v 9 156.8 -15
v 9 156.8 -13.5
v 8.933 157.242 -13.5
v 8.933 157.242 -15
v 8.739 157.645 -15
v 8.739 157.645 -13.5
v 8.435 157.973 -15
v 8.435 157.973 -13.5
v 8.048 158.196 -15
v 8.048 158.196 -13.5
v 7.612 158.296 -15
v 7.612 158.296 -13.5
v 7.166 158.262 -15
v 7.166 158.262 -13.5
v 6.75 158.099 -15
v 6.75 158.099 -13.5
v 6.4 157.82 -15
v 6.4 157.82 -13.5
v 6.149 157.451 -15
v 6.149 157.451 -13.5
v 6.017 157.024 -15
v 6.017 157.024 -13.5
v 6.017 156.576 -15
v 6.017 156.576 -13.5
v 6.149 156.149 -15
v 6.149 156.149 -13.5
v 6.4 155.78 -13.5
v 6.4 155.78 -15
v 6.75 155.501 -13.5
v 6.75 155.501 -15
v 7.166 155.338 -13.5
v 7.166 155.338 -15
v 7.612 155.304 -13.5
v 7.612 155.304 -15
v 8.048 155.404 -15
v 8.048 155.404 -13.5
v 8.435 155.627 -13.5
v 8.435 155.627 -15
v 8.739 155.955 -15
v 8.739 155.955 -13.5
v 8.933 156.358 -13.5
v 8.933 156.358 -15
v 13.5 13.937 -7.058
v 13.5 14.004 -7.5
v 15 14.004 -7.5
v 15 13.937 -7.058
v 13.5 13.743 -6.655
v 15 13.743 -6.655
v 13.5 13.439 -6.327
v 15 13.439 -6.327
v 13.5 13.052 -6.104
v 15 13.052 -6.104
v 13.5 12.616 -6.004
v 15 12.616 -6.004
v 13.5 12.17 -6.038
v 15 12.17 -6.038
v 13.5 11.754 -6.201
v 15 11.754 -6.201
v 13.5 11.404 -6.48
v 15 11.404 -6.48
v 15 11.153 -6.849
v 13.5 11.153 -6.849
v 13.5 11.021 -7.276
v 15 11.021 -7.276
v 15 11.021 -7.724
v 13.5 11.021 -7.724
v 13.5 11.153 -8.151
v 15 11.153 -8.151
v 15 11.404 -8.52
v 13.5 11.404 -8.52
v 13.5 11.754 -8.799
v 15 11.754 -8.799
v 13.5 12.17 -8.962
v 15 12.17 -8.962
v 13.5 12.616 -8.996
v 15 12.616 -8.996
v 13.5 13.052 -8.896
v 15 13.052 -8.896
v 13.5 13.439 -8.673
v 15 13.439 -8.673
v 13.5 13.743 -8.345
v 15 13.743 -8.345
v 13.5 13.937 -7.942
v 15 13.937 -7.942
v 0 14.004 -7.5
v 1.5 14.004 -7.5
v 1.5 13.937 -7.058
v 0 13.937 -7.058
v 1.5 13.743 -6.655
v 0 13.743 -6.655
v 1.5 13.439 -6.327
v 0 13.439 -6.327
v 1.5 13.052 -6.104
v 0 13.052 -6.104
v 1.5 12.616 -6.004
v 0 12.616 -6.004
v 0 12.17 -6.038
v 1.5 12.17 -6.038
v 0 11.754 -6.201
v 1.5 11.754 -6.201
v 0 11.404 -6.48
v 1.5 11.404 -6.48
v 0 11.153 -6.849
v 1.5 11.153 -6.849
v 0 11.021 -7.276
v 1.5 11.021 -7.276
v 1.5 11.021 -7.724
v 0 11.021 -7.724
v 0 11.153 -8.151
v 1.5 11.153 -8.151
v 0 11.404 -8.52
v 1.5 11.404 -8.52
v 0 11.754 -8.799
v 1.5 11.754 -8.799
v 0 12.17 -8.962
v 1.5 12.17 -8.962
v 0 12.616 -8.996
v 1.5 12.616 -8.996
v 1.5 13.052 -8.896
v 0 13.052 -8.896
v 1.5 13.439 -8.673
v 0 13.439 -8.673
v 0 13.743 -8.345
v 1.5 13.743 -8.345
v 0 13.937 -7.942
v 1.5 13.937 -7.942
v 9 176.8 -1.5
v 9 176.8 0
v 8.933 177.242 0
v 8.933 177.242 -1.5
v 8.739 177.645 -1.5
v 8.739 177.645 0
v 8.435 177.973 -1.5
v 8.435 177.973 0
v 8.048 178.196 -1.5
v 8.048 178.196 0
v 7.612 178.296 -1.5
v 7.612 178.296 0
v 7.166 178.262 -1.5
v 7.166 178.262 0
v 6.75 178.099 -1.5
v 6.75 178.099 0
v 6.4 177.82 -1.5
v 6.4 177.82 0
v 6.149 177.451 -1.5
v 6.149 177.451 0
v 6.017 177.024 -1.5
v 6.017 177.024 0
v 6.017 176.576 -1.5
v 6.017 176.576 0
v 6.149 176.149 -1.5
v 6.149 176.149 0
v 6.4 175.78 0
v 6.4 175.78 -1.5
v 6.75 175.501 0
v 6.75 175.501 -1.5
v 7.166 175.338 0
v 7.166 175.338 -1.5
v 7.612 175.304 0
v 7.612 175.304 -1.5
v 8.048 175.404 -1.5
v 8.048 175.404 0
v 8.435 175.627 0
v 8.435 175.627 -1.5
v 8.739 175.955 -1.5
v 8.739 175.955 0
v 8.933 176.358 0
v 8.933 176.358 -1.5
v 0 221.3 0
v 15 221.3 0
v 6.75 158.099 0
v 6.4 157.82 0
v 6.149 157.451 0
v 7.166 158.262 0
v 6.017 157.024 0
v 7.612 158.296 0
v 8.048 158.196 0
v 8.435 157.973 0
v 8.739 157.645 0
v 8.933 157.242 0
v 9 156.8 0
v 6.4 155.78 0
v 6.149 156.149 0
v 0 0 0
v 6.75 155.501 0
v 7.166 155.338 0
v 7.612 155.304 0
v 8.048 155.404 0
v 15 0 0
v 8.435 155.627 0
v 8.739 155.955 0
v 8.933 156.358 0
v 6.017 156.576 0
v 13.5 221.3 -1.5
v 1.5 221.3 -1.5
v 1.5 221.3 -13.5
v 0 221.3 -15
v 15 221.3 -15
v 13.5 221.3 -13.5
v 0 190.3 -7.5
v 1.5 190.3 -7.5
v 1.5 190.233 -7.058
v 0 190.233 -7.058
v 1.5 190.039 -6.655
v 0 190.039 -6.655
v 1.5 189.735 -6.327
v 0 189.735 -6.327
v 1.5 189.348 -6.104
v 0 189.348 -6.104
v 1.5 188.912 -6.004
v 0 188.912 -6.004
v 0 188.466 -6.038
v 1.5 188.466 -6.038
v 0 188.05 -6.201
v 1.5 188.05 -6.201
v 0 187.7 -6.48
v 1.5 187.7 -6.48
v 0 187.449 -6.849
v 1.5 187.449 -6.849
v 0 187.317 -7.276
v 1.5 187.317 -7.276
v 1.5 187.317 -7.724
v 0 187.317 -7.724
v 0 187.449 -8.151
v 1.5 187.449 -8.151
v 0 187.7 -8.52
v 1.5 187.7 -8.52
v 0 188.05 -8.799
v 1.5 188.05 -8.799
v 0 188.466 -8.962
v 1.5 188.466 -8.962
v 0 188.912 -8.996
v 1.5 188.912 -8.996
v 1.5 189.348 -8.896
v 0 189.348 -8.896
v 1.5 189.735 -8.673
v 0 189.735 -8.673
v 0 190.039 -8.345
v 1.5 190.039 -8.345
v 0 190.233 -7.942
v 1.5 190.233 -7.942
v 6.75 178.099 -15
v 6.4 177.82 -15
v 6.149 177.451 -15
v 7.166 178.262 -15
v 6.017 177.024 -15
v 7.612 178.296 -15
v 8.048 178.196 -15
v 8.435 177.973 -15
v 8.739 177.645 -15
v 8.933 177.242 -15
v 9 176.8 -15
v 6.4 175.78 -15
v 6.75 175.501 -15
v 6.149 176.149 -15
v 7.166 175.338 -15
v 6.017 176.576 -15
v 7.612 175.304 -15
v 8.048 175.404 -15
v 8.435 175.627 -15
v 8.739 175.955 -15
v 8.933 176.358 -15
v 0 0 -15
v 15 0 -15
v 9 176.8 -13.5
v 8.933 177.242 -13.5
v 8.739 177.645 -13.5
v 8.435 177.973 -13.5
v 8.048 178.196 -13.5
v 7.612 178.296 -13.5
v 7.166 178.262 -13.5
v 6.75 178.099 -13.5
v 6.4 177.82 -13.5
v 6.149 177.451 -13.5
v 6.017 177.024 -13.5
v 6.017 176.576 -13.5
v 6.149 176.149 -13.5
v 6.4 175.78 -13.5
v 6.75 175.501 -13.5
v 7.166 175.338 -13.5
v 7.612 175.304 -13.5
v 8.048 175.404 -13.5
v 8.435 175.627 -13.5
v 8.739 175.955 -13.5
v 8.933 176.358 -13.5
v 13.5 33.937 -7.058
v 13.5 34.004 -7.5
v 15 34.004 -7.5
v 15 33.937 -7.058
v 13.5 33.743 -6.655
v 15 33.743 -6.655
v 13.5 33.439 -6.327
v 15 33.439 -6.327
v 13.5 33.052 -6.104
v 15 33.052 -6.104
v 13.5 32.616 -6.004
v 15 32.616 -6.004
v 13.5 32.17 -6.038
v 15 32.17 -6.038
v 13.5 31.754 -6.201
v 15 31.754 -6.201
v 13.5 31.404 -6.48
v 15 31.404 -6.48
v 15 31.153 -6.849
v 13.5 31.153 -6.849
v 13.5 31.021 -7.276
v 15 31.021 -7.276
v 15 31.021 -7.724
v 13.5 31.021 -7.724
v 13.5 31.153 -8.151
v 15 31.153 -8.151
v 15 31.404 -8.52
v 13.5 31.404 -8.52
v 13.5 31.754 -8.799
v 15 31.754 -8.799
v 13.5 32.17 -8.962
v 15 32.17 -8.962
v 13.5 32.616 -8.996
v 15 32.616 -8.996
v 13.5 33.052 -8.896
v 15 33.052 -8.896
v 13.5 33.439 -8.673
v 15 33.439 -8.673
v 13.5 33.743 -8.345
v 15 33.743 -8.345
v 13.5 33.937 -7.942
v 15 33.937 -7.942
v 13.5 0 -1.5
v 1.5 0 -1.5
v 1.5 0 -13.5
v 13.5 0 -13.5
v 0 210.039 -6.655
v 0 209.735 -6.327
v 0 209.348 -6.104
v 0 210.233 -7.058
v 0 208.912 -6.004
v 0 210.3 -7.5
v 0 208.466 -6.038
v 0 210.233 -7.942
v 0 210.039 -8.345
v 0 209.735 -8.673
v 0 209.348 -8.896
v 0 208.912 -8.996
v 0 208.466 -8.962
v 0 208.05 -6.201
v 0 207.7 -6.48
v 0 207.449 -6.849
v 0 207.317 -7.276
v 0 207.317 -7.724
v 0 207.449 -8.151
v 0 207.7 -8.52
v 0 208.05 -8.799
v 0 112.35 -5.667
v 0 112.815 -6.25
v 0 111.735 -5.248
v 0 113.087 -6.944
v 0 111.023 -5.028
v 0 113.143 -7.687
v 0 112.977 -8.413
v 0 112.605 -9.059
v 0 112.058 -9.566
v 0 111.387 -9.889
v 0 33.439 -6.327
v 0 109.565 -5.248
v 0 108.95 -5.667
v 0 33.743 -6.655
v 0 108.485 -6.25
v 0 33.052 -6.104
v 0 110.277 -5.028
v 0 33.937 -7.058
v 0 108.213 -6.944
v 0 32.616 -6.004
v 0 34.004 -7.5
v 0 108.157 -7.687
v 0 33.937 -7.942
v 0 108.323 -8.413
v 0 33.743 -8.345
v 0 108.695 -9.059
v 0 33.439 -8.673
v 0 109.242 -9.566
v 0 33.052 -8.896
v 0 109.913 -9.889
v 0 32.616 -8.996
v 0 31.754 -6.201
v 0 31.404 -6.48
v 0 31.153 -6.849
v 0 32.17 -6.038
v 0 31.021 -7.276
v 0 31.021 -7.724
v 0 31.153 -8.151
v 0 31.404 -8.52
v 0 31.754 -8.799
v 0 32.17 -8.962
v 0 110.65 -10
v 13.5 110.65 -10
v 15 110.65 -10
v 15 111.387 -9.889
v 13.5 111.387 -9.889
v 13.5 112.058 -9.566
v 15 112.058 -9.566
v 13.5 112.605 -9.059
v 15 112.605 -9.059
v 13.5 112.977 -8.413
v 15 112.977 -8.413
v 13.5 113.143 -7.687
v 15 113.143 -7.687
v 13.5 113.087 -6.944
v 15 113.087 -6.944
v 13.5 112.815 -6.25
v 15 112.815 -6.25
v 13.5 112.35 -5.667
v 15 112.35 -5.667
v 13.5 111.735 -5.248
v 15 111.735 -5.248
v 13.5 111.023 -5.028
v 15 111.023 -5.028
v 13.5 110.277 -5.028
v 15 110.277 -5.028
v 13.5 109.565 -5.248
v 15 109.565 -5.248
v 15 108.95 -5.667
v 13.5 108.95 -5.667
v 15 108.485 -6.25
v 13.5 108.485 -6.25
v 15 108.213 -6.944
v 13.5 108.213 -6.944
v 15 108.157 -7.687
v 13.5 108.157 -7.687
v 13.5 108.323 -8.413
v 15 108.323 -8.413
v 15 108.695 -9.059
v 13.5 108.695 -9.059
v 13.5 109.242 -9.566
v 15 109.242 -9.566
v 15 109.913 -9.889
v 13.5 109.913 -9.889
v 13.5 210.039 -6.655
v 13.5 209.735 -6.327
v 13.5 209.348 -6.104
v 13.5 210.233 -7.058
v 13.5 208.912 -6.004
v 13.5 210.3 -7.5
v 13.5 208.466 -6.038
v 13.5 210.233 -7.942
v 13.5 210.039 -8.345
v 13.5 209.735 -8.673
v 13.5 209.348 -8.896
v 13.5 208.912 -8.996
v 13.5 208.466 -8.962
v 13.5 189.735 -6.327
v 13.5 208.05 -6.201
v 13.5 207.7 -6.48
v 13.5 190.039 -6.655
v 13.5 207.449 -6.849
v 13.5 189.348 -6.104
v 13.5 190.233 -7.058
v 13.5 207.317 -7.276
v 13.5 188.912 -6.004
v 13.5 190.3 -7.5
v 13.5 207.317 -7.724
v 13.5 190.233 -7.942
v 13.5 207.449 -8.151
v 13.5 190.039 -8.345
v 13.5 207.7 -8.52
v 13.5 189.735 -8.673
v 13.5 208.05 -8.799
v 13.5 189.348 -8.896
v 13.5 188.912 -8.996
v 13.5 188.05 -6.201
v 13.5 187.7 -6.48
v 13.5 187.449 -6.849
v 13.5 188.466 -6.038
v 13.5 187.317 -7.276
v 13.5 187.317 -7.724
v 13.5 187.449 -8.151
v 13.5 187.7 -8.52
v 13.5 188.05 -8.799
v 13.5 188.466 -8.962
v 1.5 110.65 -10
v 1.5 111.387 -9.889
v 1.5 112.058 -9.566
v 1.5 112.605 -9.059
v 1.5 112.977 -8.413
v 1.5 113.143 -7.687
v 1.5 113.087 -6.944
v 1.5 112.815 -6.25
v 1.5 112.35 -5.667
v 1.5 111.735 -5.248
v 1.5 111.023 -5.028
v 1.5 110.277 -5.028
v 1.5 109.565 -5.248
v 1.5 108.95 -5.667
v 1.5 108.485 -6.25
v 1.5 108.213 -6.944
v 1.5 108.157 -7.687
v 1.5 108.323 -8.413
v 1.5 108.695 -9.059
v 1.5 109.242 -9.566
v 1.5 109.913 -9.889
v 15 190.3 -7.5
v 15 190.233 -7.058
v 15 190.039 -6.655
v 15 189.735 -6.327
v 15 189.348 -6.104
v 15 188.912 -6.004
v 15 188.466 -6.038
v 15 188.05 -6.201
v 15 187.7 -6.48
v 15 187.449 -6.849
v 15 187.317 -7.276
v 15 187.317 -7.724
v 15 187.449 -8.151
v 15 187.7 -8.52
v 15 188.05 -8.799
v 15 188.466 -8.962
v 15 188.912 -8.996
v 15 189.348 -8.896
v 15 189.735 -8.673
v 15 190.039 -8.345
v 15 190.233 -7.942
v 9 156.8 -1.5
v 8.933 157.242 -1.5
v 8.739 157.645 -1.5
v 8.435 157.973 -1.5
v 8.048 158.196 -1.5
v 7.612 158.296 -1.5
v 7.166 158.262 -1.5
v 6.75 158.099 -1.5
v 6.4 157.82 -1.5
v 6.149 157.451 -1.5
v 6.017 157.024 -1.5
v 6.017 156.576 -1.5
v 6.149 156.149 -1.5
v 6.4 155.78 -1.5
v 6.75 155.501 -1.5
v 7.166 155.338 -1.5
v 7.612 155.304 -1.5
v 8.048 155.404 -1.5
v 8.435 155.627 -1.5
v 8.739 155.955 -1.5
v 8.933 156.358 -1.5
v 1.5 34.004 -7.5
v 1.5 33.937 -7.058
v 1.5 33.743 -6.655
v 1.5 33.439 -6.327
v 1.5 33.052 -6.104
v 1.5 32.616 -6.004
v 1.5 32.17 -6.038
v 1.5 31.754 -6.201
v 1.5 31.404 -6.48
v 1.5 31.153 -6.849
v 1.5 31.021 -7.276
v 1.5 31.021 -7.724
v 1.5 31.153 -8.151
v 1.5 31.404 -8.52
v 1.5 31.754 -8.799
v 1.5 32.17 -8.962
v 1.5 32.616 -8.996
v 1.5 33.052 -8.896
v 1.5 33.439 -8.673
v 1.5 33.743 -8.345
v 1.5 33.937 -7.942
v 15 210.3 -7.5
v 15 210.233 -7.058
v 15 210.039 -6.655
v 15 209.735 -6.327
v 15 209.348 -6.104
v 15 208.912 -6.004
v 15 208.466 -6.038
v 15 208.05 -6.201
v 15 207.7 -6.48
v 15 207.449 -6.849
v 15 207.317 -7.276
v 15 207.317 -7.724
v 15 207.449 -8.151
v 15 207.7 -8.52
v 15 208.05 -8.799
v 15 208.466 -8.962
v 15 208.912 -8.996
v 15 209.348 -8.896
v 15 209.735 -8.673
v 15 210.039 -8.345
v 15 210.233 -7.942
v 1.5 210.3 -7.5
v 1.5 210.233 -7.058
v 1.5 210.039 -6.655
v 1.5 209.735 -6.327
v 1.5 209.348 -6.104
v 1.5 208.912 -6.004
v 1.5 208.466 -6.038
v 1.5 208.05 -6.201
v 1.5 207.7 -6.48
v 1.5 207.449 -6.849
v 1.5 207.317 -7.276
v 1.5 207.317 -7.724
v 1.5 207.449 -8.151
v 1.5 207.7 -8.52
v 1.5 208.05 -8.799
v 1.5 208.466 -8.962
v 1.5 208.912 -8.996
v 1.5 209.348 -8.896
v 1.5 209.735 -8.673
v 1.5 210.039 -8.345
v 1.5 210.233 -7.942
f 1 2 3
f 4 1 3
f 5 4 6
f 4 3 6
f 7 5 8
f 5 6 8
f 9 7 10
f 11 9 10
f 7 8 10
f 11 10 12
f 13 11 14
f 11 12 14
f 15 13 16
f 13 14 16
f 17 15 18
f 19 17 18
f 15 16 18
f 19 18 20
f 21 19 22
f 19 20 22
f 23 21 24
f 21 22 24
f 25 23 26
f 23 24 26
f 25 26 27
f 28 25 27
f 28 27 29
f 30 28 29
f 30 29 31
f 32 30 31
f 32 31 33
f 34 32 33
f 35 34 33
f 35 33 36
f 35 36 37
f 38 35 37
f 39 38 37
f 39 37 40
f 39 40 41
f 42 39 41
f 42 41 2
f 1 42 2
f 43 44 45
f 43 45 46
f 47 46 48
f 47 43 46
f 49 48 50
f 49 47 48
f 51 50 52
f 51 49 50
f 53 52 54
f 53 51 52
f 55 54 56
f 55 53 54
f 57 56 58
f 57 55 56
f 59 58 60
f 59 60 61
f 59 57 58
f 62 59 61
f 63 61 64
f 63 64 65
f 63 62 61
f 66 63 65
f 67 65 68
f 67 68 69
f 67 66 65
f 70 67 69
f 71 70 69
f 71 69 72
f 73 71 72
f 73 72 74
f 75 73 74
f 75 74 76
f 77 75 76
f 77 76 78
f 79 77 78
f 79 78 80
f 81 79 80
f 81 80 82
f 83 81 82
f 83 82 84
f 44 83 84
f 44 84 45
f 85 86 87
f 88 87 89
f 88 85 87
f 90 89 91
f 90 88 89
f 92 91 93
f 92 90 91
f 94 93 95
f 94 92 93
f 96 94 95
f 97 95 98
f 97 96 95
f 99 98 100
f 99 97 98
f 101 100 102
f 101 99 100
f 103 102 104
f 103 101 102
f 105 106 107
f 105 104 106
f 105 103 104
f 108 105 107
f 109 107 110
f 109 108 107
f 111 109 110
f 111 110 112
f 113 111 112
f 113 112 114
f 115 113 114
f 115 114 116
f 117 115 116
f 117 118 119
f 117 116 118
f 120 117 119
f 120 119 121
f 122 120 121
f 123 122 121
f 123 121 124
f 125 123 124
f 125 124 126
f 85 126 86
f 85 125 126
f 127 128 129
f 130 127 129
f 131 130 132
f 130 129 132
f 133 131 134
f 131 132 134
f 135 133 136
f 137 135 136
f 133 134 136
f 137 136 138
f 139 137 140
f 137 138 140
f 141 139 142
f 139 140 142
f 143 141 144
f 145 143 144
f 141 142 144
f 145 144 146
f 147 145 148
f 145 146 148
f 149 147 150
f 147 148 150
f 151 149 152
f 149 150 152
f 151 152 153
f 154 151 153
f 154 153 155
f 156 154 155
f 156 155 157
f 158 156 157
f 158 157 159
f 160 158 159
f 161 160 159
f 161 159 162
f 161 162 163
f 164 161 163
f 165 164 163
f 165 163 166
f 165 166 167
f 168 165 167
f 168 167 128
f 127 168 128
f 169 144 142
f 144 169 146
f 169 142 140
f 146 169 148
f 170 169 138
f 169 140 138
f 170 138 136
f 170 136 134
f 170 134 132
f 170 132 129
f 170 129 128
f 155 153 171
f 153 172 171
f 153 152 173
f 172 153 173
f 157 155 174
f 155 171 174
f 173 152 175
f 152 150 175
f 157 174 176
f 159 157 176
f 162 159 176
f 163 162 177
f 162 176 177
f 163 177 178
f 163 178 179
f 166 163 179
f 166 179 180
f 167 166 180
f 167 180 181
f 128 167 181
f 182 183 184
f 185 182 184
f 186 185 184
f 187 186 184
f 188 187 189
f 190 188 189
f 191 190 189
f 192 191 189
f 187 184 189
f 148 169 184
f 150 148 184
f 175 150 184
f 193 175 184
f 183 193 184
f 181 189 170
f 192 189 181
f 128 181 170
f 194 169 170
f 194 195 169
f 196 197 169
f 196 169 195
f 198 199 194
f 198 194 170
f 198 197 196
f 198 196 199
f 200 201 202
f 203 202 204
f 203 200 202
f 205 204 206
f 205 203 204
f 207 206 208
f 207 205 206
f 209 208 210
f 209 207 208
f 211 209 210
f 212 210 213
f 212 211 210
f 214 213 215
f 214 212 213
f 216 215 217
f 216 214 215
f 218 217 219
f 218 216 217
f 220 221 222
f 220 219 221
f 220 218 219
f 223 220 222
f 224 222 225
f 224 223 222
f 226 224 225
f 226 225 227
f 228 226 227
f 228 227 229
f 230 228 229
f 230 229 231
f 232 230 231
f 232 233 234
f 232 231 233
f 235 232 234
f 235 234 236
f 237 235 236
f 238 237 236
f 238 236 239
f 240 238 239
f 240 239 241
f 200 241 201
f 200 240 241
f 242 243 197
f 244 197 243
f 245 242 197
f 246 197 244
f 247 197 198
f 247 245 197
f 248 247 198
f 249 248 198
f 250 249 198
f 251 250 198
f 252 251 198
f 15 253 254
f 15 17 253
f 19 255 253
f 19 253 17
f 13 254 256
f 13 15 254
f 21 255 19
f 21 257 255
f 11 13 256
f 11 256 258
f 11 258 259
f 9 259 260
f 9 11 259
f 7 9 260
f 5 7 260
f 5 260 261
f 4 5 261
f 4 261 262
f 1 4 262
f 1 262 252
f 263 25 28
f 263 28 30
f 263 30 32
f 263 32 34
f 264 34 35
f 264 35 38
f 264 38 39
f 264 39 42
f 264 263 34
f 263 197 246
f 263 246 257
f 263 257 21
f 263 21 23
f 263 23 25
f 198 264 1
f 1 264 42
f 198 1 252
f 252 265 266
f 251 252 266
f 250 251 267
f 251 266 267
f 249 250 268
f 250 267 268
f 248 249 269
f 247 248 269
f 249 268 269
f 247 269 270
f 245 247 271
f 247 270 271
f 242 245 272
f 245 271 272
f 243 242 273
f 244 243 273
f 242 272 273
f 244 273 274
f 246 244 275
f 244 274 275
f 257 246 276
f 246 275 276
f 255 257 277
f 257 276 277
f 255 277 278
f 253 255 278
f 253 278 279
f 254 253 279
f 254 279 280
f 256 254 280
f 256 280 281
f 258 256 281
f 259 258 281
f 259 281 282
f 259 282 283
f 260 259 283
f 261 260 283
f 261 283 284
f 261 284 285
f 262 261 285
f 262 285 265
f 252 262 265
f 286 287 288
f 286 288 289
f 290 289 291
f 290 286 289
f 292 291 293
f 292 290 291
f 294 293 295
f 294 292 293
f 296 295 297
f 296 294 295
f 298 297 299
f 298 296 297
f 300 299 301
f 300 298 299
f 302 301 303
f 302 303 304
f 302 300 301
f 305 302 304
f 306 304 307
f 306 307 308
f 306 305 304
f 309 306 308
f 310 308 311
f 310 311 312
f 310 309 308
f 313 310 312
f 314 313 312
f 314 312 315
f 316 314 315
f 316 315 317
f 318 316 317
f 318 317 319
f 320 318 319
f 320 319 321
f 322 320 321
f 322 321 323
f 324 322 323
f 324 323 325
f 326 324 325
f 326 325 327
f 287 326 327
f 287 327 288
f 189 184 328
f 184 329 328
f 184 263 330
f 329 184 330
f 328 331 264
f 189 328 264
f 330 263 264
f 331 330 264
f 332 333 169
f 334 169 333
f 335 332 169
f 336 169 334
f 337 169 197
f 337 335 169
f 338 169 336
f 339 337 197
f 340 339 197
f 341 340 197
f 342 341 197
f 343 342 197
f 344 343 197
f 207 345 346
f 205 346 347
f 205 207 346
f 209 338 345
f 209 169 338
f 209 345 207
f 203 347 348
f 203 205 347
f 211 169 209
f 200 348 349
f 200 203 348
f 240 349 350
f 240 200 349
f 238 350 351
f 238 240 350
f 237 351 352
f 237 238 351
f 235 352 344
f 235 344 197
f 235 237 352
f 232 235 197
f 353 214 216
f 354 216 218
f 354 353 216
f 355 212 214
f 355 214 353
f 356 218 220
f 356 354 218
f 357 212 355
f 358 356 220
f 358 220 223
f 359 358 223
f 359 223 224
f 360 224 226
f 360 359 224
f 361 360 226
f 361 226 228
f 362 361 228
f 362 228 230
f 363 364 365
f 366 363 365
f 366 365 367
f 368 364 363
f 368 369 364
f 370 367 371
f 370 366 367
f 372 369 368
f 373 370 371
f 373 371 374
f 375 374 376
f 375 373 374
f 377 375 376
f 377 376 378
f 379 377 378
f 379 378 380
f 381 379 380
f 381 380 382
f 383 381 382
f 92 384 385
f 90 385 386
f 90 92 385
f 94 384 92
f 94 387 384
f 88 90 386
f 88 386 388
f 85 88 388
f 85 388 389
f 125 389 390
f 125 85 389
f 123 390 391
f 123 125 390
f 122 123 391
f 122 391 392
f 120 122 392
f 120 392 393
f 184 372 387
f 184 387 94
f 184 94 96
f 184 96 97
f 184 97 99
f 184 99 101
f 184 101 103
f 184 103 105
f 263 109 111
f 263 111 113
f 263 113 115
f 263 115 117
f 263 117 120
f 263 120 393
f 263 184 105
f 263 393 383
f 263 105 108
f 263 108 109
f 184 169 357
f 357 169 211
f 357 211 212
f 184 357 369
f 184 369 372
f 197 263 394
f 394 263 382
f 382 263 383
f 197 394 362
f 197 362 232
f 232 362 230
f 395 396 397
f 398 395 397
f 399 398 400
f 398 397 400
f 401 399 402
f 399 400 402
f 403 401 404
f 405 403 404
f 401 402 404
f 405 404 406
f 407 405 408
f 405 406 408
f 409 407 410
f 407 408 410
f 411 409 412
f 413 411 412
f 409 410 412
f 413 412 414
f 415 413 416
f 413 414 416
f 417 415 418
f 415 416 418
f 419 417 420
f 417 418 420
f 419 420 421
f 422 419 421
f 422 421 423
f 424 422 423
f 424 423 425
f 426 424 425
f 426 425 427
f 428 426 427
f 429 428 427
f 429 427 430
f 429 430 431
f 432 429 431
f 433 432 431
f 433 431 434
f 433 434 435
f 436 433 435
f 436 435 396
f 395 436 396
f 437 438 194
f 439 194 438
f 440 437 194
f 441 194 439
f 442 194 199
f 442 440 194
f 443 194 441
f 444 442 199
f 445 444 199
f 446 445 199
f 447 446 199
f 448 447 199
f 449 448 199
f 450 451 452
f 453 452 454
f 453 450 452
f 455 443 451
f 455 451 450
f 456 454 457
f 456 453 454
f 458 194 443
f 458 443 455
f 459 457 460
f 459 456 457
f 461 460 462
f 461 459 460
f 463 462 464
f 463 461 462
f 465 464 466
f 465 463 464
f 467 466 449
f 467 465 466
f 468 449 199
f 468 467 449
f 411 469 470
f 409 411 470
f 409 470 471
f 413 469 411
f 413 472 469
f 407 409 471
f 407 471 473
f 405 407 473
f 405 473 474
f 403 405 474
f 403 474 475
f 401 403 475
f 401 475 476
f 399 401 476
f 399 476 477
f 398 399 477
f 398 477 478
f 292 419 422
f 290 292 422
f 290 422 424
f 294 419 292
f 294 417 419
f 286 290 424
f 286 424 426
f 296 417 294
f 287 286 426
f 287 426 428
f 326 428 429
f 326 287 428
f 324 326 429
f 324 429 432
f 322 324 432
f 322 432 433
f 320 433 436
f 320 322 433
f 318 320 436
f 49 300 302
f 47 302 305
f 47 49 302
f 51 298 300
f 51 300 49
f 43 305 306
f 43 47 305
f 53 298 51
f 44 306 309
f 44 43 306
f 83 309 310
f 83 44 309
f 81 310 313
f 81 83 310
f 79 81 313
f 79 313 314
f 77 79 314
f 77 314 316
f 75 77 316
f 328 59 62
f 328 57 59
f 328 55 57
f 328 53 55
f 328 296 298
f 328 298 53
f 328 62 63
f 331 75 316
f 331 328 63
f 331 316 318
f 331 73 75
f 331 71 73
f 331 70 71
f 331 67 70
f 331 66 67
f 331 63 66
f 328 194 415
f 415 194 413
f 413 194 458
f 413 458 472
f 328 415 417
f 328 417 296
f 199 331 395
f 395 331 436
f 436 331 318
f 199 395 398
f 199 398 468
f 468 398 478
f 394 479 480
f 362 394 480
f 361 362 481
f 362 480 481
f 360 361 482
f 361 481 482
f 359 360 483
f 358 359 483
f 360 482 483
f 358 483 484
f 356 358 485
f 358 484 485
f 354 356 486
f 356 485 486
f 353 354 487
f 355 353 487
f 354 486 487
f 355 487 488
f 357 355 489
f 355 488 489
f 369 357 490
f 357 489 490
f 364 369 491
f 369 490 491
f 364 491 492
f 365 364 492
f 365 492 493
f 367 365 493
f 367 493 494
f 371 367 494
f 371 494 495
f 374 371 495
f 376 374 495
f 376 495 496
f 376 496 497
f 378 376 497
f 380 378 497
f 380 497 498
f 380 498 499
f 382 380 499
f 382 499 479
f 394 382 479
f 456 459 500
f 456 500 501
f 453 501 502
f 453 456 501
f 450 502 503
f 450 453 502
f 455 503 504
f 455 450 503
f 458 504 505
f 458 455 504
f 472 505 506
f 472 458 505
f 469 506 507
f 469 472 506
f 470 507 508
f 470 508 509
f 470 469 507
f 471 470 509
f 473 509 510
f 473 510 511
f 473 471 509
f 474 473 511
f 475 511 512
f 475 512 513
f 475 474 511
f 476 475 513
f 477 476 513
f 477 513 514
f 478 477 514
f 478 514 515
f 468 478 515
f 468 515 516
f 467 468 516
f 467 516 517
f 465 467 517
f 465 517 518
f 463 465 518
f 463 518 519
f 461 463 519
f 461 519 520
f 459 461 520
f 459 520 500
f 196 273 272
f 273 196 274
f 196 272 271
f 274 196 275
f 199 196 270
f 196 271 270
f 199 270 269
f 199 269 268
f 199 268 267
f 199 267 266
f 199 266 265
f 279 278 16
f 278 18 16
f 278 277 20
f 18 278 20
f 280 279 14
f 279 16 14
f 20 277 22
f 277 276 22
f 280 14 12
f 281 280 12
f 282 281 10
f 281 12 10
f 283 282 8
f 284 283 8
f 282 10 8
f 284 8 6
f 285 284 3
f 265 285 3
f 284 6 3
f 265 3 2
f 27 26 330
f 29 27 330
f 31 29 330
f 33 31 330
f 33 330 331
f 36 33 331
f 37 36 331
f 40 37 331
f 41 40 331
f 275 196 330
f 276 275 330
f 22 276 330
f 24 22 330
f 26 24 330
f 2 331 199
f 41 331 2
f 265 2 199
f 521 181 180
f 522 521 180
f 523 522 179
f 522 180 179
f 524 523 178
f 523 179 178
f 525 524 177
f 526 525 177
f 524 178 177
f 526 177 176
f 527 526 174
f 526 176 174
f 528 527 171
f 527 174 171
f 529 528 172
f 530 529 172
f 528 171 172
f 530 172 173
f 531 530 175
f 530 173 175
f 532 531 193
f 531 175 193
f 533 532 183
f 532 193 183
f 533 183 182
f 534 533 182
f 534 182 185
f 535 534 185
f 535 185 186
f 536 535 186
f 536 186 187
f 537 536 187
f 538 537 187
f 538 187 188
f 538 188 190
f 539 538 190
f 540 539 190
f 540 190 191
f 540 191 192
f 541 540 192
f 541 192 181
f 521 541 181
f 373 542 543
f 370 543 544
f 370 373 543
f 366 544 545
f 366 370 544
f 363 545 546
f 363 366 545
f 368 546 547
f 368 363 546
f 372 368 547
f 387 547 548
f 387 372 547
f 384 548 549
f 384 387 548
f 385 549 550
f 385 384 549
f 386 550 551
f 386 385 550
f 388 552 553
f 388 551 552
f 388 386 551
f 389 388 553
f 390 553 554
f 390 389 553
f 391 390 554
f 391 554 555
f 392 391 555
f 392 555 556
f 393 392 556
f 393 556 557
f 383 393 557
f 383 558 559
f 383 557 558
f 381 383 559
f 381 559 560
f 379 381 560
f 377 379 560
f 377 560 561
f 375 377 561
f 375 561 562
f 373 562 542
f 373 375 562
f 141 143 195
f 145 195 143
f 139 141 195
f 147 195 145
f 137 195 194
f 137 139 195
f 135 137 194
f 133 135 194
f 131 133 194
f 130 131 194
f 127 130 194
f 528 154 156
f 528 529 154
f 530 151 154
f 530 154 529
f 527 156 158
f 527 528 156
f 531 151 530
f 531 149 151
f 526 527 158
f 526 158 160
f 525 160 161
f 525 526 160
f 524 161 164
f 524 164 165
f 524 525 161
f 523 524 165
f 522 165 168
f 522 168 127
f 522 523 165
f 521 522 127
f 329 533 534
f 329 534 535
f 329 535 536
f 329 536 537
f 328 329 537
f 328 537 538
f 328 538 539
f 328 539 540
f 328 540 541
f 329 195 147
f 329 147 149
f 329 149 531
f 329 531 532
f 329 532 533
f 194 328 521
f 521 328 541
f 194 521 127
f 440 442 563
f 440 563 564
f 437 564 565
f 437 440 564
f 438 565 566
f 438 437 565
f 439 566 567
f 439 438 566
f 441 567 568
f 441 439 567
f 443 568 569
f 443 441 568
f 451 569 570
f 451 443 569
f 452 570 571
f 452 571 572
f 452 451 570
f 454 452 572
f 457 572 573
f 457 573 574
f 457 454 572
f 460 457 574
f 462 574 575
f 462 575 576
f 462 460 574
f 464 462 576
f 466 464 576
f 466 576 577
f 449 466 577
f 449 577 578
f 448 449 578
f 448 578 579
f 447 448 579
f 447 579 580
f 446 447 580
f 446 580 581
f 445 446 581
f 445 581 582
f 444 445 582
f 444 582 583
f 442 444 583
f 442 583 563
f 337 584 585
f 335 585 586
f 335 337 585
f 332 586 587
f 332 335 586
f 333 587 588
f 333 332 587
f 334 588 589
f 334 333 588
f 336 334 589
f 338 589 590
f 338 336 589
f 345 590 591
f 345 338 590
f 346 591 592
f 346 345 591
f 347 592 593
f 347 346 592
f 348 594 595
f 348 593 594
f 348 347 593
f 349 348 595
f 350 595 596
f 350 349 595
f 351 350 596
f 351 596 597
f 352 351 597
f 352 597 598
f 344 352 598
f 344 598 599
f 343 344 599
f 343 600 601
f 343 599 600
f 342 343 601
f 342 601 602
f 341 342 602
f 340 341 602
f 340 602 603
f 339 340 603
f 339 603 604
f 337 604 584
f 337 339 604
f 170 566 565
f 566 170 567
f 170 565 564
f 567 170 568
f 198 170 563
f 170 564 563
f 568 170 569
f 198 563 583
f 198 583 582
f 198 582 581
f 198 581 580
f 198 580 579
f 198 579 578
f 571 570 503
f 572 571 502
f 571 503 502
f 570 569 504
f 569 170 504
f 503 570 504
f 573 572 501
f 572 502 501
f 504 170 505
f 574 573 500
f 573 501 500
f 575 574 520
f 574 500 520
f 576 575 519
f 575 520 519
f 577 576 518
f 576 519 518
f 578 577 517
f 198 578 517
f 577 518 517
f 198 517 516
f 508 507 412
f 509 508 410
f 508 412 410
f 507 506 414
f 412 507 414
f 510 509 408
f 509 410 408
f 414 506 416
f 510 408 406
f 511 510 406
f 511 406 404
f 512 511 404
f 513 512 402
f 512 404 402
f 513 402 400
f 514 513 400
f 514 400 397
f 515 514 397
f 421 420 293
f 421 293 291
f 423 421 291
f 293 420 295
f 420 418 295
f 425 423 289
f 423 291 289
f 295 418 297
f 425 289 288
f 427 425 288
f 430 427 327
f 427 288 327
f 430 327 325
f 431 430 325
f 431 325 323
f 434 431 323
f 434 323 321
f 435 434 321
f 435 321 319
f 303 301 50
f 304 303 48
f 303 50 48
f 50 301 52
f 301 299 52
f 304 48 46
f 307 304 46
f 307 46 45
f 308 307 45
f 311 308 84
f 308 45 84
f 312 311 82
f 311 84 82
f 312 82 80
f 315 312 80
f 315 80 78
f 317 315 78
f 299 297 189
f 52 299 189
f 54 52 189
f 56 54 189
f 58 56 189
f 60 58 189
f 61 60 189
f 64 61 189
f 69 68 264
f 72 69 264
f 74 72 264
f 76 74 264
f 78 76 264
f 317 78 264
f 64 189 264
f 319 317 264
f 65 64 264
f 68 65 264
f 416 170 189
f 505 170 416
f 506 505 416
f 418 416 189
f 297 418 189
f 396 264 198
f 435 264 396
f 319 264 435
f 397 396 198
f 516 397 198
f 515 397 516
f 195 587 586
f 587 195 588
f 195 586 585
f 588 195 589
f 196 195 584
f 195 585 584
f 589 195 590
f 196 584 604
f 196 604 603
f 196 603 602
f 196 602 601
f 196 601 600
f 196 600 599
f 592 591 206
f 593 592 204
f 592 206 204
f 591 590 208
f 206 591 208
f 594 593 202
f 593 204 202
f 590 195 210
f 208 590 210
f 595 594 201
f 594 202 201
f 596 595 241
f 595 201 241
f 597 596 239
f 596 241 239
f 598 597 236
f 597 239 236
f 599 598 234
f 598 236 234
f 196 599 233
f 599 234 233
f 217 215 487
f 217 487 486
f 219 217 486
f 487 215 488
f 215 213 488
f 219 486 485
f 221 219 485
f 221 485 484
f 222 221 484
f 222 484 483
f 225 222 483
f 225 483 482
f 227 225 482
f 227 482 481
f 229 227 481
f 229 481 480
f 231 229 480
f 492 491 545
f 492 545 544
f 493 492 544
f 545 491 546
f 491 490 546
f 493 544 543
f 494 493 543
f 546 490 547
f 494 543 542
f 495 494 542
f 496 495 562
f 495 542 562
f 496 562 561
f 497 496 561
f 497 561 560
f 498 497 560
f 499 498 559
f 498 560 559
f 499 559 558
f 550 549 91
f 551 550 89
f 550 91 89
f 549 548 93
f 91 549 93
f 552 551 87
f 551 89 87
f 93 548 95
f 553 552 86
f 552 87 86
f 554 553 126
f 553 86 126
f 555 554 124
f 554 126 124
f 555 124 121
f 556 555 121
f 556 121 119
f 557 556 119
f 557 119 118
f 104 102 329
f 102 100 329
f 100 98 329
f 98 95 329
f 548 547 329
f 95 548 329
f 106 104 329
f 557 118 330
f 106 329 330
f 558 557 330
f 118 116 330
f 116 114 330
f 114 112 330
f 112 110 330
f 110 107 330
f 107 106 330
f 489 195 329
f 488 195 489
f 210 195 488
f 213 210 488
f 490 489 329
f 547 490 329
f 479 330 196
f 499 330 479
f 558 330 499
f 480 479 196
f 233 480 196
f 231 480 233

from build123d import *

# Parameters (mm, degrees)
SKETCH1_W              = 15
SKETCH1_H              = 15
SKETCH1_W_2            = 12
SKETCH1_H_2            = 12
EXTRUDE_THIN1_DEPTH    = 221.3
CUT_EXTRUDE1_OUTLINE_R = 1.5
CUT_EXTRUDE1_DEPTH     = 15
SKETCH3_R              = 2.5
CUT_EXTRUDE2_DEPTH     = 223.314394496
SKETCH4_R              = 1.5
CUT_EXTRUDE3_DEPTH     = 223.314394496


# Read off the part's stored shape, not the designer's step: Cut-Extrude1
with BuildPart() as part:
    # Sketch1 → Extrude-Thin1 (new body)
    with BuildSketch(Plane(origin=(0, 0, 0), x_dir=(1, 0, 0), z_dir=(0, 1, 0))):
        with Locations((7.5, 7.5)):
            Rectangle(SKETCH1_W, SKETCH1_H)
        with Locations((7.5, 7.5)):
            Rectangle(SKETCH1_W_2, SKETCH1_H_2, mode=Mode.SUBTRACT)
    extrude(amount=EXTRUDE_THIN1_DEPTH)

    # Cut-Extrude1 outline → Cut-Extrude1 (cut)
    with BuildSketch(Plane.YZ):
        with Locations((12.504, -7.5)):
            Circle(CUT_EXTRUDE1_OUTLINE_R)
        with Locations((32.504, -7.5)):
            Circle(CUT_EXTRUDE1_OUTLINE_R)
        with Locations((188.8, -7.5)):
            Circle(CUT_EXTRUDE1_OUTLINE_R)
        with Locations((208.8, -7.5)):
            Circle(CUT_EXTRUDE1_OUTLINE_R)
    extrude(amount=CUT_EXTRUDE1_DEPTH, mode=Mode.SUBTRACT)

    # Sketch3 → Cut-Extrude2 (cut, through all)
    with BuildSketch(Plane(origin=(15, 0, 0), x_dir=(0, 0, -1), z_dir=(1, 0, 0))):
        with Locations((7.5, 110.65)):
            Circle(SKETCH3_R)
    extrude(amount=-CUT_EXTRUDE2_DEPTH, mode=Mode.SUBTRACT)

    # Sketch4 (on Front Plane) → Cut-Extrude3 (cut, through all)
    with BuildSketch(Plane.XY):
        with Locations((7.5, 156.8)):
            Circle(SKETCH4_R)
        with Locations((7.5, 176.8)):
            Circle(SKETCH4_R)
    extrude(amount=-CUT_EXTRUDE3_DEPTH, mode=Mode.SUBTRACT)


solid = part.part
